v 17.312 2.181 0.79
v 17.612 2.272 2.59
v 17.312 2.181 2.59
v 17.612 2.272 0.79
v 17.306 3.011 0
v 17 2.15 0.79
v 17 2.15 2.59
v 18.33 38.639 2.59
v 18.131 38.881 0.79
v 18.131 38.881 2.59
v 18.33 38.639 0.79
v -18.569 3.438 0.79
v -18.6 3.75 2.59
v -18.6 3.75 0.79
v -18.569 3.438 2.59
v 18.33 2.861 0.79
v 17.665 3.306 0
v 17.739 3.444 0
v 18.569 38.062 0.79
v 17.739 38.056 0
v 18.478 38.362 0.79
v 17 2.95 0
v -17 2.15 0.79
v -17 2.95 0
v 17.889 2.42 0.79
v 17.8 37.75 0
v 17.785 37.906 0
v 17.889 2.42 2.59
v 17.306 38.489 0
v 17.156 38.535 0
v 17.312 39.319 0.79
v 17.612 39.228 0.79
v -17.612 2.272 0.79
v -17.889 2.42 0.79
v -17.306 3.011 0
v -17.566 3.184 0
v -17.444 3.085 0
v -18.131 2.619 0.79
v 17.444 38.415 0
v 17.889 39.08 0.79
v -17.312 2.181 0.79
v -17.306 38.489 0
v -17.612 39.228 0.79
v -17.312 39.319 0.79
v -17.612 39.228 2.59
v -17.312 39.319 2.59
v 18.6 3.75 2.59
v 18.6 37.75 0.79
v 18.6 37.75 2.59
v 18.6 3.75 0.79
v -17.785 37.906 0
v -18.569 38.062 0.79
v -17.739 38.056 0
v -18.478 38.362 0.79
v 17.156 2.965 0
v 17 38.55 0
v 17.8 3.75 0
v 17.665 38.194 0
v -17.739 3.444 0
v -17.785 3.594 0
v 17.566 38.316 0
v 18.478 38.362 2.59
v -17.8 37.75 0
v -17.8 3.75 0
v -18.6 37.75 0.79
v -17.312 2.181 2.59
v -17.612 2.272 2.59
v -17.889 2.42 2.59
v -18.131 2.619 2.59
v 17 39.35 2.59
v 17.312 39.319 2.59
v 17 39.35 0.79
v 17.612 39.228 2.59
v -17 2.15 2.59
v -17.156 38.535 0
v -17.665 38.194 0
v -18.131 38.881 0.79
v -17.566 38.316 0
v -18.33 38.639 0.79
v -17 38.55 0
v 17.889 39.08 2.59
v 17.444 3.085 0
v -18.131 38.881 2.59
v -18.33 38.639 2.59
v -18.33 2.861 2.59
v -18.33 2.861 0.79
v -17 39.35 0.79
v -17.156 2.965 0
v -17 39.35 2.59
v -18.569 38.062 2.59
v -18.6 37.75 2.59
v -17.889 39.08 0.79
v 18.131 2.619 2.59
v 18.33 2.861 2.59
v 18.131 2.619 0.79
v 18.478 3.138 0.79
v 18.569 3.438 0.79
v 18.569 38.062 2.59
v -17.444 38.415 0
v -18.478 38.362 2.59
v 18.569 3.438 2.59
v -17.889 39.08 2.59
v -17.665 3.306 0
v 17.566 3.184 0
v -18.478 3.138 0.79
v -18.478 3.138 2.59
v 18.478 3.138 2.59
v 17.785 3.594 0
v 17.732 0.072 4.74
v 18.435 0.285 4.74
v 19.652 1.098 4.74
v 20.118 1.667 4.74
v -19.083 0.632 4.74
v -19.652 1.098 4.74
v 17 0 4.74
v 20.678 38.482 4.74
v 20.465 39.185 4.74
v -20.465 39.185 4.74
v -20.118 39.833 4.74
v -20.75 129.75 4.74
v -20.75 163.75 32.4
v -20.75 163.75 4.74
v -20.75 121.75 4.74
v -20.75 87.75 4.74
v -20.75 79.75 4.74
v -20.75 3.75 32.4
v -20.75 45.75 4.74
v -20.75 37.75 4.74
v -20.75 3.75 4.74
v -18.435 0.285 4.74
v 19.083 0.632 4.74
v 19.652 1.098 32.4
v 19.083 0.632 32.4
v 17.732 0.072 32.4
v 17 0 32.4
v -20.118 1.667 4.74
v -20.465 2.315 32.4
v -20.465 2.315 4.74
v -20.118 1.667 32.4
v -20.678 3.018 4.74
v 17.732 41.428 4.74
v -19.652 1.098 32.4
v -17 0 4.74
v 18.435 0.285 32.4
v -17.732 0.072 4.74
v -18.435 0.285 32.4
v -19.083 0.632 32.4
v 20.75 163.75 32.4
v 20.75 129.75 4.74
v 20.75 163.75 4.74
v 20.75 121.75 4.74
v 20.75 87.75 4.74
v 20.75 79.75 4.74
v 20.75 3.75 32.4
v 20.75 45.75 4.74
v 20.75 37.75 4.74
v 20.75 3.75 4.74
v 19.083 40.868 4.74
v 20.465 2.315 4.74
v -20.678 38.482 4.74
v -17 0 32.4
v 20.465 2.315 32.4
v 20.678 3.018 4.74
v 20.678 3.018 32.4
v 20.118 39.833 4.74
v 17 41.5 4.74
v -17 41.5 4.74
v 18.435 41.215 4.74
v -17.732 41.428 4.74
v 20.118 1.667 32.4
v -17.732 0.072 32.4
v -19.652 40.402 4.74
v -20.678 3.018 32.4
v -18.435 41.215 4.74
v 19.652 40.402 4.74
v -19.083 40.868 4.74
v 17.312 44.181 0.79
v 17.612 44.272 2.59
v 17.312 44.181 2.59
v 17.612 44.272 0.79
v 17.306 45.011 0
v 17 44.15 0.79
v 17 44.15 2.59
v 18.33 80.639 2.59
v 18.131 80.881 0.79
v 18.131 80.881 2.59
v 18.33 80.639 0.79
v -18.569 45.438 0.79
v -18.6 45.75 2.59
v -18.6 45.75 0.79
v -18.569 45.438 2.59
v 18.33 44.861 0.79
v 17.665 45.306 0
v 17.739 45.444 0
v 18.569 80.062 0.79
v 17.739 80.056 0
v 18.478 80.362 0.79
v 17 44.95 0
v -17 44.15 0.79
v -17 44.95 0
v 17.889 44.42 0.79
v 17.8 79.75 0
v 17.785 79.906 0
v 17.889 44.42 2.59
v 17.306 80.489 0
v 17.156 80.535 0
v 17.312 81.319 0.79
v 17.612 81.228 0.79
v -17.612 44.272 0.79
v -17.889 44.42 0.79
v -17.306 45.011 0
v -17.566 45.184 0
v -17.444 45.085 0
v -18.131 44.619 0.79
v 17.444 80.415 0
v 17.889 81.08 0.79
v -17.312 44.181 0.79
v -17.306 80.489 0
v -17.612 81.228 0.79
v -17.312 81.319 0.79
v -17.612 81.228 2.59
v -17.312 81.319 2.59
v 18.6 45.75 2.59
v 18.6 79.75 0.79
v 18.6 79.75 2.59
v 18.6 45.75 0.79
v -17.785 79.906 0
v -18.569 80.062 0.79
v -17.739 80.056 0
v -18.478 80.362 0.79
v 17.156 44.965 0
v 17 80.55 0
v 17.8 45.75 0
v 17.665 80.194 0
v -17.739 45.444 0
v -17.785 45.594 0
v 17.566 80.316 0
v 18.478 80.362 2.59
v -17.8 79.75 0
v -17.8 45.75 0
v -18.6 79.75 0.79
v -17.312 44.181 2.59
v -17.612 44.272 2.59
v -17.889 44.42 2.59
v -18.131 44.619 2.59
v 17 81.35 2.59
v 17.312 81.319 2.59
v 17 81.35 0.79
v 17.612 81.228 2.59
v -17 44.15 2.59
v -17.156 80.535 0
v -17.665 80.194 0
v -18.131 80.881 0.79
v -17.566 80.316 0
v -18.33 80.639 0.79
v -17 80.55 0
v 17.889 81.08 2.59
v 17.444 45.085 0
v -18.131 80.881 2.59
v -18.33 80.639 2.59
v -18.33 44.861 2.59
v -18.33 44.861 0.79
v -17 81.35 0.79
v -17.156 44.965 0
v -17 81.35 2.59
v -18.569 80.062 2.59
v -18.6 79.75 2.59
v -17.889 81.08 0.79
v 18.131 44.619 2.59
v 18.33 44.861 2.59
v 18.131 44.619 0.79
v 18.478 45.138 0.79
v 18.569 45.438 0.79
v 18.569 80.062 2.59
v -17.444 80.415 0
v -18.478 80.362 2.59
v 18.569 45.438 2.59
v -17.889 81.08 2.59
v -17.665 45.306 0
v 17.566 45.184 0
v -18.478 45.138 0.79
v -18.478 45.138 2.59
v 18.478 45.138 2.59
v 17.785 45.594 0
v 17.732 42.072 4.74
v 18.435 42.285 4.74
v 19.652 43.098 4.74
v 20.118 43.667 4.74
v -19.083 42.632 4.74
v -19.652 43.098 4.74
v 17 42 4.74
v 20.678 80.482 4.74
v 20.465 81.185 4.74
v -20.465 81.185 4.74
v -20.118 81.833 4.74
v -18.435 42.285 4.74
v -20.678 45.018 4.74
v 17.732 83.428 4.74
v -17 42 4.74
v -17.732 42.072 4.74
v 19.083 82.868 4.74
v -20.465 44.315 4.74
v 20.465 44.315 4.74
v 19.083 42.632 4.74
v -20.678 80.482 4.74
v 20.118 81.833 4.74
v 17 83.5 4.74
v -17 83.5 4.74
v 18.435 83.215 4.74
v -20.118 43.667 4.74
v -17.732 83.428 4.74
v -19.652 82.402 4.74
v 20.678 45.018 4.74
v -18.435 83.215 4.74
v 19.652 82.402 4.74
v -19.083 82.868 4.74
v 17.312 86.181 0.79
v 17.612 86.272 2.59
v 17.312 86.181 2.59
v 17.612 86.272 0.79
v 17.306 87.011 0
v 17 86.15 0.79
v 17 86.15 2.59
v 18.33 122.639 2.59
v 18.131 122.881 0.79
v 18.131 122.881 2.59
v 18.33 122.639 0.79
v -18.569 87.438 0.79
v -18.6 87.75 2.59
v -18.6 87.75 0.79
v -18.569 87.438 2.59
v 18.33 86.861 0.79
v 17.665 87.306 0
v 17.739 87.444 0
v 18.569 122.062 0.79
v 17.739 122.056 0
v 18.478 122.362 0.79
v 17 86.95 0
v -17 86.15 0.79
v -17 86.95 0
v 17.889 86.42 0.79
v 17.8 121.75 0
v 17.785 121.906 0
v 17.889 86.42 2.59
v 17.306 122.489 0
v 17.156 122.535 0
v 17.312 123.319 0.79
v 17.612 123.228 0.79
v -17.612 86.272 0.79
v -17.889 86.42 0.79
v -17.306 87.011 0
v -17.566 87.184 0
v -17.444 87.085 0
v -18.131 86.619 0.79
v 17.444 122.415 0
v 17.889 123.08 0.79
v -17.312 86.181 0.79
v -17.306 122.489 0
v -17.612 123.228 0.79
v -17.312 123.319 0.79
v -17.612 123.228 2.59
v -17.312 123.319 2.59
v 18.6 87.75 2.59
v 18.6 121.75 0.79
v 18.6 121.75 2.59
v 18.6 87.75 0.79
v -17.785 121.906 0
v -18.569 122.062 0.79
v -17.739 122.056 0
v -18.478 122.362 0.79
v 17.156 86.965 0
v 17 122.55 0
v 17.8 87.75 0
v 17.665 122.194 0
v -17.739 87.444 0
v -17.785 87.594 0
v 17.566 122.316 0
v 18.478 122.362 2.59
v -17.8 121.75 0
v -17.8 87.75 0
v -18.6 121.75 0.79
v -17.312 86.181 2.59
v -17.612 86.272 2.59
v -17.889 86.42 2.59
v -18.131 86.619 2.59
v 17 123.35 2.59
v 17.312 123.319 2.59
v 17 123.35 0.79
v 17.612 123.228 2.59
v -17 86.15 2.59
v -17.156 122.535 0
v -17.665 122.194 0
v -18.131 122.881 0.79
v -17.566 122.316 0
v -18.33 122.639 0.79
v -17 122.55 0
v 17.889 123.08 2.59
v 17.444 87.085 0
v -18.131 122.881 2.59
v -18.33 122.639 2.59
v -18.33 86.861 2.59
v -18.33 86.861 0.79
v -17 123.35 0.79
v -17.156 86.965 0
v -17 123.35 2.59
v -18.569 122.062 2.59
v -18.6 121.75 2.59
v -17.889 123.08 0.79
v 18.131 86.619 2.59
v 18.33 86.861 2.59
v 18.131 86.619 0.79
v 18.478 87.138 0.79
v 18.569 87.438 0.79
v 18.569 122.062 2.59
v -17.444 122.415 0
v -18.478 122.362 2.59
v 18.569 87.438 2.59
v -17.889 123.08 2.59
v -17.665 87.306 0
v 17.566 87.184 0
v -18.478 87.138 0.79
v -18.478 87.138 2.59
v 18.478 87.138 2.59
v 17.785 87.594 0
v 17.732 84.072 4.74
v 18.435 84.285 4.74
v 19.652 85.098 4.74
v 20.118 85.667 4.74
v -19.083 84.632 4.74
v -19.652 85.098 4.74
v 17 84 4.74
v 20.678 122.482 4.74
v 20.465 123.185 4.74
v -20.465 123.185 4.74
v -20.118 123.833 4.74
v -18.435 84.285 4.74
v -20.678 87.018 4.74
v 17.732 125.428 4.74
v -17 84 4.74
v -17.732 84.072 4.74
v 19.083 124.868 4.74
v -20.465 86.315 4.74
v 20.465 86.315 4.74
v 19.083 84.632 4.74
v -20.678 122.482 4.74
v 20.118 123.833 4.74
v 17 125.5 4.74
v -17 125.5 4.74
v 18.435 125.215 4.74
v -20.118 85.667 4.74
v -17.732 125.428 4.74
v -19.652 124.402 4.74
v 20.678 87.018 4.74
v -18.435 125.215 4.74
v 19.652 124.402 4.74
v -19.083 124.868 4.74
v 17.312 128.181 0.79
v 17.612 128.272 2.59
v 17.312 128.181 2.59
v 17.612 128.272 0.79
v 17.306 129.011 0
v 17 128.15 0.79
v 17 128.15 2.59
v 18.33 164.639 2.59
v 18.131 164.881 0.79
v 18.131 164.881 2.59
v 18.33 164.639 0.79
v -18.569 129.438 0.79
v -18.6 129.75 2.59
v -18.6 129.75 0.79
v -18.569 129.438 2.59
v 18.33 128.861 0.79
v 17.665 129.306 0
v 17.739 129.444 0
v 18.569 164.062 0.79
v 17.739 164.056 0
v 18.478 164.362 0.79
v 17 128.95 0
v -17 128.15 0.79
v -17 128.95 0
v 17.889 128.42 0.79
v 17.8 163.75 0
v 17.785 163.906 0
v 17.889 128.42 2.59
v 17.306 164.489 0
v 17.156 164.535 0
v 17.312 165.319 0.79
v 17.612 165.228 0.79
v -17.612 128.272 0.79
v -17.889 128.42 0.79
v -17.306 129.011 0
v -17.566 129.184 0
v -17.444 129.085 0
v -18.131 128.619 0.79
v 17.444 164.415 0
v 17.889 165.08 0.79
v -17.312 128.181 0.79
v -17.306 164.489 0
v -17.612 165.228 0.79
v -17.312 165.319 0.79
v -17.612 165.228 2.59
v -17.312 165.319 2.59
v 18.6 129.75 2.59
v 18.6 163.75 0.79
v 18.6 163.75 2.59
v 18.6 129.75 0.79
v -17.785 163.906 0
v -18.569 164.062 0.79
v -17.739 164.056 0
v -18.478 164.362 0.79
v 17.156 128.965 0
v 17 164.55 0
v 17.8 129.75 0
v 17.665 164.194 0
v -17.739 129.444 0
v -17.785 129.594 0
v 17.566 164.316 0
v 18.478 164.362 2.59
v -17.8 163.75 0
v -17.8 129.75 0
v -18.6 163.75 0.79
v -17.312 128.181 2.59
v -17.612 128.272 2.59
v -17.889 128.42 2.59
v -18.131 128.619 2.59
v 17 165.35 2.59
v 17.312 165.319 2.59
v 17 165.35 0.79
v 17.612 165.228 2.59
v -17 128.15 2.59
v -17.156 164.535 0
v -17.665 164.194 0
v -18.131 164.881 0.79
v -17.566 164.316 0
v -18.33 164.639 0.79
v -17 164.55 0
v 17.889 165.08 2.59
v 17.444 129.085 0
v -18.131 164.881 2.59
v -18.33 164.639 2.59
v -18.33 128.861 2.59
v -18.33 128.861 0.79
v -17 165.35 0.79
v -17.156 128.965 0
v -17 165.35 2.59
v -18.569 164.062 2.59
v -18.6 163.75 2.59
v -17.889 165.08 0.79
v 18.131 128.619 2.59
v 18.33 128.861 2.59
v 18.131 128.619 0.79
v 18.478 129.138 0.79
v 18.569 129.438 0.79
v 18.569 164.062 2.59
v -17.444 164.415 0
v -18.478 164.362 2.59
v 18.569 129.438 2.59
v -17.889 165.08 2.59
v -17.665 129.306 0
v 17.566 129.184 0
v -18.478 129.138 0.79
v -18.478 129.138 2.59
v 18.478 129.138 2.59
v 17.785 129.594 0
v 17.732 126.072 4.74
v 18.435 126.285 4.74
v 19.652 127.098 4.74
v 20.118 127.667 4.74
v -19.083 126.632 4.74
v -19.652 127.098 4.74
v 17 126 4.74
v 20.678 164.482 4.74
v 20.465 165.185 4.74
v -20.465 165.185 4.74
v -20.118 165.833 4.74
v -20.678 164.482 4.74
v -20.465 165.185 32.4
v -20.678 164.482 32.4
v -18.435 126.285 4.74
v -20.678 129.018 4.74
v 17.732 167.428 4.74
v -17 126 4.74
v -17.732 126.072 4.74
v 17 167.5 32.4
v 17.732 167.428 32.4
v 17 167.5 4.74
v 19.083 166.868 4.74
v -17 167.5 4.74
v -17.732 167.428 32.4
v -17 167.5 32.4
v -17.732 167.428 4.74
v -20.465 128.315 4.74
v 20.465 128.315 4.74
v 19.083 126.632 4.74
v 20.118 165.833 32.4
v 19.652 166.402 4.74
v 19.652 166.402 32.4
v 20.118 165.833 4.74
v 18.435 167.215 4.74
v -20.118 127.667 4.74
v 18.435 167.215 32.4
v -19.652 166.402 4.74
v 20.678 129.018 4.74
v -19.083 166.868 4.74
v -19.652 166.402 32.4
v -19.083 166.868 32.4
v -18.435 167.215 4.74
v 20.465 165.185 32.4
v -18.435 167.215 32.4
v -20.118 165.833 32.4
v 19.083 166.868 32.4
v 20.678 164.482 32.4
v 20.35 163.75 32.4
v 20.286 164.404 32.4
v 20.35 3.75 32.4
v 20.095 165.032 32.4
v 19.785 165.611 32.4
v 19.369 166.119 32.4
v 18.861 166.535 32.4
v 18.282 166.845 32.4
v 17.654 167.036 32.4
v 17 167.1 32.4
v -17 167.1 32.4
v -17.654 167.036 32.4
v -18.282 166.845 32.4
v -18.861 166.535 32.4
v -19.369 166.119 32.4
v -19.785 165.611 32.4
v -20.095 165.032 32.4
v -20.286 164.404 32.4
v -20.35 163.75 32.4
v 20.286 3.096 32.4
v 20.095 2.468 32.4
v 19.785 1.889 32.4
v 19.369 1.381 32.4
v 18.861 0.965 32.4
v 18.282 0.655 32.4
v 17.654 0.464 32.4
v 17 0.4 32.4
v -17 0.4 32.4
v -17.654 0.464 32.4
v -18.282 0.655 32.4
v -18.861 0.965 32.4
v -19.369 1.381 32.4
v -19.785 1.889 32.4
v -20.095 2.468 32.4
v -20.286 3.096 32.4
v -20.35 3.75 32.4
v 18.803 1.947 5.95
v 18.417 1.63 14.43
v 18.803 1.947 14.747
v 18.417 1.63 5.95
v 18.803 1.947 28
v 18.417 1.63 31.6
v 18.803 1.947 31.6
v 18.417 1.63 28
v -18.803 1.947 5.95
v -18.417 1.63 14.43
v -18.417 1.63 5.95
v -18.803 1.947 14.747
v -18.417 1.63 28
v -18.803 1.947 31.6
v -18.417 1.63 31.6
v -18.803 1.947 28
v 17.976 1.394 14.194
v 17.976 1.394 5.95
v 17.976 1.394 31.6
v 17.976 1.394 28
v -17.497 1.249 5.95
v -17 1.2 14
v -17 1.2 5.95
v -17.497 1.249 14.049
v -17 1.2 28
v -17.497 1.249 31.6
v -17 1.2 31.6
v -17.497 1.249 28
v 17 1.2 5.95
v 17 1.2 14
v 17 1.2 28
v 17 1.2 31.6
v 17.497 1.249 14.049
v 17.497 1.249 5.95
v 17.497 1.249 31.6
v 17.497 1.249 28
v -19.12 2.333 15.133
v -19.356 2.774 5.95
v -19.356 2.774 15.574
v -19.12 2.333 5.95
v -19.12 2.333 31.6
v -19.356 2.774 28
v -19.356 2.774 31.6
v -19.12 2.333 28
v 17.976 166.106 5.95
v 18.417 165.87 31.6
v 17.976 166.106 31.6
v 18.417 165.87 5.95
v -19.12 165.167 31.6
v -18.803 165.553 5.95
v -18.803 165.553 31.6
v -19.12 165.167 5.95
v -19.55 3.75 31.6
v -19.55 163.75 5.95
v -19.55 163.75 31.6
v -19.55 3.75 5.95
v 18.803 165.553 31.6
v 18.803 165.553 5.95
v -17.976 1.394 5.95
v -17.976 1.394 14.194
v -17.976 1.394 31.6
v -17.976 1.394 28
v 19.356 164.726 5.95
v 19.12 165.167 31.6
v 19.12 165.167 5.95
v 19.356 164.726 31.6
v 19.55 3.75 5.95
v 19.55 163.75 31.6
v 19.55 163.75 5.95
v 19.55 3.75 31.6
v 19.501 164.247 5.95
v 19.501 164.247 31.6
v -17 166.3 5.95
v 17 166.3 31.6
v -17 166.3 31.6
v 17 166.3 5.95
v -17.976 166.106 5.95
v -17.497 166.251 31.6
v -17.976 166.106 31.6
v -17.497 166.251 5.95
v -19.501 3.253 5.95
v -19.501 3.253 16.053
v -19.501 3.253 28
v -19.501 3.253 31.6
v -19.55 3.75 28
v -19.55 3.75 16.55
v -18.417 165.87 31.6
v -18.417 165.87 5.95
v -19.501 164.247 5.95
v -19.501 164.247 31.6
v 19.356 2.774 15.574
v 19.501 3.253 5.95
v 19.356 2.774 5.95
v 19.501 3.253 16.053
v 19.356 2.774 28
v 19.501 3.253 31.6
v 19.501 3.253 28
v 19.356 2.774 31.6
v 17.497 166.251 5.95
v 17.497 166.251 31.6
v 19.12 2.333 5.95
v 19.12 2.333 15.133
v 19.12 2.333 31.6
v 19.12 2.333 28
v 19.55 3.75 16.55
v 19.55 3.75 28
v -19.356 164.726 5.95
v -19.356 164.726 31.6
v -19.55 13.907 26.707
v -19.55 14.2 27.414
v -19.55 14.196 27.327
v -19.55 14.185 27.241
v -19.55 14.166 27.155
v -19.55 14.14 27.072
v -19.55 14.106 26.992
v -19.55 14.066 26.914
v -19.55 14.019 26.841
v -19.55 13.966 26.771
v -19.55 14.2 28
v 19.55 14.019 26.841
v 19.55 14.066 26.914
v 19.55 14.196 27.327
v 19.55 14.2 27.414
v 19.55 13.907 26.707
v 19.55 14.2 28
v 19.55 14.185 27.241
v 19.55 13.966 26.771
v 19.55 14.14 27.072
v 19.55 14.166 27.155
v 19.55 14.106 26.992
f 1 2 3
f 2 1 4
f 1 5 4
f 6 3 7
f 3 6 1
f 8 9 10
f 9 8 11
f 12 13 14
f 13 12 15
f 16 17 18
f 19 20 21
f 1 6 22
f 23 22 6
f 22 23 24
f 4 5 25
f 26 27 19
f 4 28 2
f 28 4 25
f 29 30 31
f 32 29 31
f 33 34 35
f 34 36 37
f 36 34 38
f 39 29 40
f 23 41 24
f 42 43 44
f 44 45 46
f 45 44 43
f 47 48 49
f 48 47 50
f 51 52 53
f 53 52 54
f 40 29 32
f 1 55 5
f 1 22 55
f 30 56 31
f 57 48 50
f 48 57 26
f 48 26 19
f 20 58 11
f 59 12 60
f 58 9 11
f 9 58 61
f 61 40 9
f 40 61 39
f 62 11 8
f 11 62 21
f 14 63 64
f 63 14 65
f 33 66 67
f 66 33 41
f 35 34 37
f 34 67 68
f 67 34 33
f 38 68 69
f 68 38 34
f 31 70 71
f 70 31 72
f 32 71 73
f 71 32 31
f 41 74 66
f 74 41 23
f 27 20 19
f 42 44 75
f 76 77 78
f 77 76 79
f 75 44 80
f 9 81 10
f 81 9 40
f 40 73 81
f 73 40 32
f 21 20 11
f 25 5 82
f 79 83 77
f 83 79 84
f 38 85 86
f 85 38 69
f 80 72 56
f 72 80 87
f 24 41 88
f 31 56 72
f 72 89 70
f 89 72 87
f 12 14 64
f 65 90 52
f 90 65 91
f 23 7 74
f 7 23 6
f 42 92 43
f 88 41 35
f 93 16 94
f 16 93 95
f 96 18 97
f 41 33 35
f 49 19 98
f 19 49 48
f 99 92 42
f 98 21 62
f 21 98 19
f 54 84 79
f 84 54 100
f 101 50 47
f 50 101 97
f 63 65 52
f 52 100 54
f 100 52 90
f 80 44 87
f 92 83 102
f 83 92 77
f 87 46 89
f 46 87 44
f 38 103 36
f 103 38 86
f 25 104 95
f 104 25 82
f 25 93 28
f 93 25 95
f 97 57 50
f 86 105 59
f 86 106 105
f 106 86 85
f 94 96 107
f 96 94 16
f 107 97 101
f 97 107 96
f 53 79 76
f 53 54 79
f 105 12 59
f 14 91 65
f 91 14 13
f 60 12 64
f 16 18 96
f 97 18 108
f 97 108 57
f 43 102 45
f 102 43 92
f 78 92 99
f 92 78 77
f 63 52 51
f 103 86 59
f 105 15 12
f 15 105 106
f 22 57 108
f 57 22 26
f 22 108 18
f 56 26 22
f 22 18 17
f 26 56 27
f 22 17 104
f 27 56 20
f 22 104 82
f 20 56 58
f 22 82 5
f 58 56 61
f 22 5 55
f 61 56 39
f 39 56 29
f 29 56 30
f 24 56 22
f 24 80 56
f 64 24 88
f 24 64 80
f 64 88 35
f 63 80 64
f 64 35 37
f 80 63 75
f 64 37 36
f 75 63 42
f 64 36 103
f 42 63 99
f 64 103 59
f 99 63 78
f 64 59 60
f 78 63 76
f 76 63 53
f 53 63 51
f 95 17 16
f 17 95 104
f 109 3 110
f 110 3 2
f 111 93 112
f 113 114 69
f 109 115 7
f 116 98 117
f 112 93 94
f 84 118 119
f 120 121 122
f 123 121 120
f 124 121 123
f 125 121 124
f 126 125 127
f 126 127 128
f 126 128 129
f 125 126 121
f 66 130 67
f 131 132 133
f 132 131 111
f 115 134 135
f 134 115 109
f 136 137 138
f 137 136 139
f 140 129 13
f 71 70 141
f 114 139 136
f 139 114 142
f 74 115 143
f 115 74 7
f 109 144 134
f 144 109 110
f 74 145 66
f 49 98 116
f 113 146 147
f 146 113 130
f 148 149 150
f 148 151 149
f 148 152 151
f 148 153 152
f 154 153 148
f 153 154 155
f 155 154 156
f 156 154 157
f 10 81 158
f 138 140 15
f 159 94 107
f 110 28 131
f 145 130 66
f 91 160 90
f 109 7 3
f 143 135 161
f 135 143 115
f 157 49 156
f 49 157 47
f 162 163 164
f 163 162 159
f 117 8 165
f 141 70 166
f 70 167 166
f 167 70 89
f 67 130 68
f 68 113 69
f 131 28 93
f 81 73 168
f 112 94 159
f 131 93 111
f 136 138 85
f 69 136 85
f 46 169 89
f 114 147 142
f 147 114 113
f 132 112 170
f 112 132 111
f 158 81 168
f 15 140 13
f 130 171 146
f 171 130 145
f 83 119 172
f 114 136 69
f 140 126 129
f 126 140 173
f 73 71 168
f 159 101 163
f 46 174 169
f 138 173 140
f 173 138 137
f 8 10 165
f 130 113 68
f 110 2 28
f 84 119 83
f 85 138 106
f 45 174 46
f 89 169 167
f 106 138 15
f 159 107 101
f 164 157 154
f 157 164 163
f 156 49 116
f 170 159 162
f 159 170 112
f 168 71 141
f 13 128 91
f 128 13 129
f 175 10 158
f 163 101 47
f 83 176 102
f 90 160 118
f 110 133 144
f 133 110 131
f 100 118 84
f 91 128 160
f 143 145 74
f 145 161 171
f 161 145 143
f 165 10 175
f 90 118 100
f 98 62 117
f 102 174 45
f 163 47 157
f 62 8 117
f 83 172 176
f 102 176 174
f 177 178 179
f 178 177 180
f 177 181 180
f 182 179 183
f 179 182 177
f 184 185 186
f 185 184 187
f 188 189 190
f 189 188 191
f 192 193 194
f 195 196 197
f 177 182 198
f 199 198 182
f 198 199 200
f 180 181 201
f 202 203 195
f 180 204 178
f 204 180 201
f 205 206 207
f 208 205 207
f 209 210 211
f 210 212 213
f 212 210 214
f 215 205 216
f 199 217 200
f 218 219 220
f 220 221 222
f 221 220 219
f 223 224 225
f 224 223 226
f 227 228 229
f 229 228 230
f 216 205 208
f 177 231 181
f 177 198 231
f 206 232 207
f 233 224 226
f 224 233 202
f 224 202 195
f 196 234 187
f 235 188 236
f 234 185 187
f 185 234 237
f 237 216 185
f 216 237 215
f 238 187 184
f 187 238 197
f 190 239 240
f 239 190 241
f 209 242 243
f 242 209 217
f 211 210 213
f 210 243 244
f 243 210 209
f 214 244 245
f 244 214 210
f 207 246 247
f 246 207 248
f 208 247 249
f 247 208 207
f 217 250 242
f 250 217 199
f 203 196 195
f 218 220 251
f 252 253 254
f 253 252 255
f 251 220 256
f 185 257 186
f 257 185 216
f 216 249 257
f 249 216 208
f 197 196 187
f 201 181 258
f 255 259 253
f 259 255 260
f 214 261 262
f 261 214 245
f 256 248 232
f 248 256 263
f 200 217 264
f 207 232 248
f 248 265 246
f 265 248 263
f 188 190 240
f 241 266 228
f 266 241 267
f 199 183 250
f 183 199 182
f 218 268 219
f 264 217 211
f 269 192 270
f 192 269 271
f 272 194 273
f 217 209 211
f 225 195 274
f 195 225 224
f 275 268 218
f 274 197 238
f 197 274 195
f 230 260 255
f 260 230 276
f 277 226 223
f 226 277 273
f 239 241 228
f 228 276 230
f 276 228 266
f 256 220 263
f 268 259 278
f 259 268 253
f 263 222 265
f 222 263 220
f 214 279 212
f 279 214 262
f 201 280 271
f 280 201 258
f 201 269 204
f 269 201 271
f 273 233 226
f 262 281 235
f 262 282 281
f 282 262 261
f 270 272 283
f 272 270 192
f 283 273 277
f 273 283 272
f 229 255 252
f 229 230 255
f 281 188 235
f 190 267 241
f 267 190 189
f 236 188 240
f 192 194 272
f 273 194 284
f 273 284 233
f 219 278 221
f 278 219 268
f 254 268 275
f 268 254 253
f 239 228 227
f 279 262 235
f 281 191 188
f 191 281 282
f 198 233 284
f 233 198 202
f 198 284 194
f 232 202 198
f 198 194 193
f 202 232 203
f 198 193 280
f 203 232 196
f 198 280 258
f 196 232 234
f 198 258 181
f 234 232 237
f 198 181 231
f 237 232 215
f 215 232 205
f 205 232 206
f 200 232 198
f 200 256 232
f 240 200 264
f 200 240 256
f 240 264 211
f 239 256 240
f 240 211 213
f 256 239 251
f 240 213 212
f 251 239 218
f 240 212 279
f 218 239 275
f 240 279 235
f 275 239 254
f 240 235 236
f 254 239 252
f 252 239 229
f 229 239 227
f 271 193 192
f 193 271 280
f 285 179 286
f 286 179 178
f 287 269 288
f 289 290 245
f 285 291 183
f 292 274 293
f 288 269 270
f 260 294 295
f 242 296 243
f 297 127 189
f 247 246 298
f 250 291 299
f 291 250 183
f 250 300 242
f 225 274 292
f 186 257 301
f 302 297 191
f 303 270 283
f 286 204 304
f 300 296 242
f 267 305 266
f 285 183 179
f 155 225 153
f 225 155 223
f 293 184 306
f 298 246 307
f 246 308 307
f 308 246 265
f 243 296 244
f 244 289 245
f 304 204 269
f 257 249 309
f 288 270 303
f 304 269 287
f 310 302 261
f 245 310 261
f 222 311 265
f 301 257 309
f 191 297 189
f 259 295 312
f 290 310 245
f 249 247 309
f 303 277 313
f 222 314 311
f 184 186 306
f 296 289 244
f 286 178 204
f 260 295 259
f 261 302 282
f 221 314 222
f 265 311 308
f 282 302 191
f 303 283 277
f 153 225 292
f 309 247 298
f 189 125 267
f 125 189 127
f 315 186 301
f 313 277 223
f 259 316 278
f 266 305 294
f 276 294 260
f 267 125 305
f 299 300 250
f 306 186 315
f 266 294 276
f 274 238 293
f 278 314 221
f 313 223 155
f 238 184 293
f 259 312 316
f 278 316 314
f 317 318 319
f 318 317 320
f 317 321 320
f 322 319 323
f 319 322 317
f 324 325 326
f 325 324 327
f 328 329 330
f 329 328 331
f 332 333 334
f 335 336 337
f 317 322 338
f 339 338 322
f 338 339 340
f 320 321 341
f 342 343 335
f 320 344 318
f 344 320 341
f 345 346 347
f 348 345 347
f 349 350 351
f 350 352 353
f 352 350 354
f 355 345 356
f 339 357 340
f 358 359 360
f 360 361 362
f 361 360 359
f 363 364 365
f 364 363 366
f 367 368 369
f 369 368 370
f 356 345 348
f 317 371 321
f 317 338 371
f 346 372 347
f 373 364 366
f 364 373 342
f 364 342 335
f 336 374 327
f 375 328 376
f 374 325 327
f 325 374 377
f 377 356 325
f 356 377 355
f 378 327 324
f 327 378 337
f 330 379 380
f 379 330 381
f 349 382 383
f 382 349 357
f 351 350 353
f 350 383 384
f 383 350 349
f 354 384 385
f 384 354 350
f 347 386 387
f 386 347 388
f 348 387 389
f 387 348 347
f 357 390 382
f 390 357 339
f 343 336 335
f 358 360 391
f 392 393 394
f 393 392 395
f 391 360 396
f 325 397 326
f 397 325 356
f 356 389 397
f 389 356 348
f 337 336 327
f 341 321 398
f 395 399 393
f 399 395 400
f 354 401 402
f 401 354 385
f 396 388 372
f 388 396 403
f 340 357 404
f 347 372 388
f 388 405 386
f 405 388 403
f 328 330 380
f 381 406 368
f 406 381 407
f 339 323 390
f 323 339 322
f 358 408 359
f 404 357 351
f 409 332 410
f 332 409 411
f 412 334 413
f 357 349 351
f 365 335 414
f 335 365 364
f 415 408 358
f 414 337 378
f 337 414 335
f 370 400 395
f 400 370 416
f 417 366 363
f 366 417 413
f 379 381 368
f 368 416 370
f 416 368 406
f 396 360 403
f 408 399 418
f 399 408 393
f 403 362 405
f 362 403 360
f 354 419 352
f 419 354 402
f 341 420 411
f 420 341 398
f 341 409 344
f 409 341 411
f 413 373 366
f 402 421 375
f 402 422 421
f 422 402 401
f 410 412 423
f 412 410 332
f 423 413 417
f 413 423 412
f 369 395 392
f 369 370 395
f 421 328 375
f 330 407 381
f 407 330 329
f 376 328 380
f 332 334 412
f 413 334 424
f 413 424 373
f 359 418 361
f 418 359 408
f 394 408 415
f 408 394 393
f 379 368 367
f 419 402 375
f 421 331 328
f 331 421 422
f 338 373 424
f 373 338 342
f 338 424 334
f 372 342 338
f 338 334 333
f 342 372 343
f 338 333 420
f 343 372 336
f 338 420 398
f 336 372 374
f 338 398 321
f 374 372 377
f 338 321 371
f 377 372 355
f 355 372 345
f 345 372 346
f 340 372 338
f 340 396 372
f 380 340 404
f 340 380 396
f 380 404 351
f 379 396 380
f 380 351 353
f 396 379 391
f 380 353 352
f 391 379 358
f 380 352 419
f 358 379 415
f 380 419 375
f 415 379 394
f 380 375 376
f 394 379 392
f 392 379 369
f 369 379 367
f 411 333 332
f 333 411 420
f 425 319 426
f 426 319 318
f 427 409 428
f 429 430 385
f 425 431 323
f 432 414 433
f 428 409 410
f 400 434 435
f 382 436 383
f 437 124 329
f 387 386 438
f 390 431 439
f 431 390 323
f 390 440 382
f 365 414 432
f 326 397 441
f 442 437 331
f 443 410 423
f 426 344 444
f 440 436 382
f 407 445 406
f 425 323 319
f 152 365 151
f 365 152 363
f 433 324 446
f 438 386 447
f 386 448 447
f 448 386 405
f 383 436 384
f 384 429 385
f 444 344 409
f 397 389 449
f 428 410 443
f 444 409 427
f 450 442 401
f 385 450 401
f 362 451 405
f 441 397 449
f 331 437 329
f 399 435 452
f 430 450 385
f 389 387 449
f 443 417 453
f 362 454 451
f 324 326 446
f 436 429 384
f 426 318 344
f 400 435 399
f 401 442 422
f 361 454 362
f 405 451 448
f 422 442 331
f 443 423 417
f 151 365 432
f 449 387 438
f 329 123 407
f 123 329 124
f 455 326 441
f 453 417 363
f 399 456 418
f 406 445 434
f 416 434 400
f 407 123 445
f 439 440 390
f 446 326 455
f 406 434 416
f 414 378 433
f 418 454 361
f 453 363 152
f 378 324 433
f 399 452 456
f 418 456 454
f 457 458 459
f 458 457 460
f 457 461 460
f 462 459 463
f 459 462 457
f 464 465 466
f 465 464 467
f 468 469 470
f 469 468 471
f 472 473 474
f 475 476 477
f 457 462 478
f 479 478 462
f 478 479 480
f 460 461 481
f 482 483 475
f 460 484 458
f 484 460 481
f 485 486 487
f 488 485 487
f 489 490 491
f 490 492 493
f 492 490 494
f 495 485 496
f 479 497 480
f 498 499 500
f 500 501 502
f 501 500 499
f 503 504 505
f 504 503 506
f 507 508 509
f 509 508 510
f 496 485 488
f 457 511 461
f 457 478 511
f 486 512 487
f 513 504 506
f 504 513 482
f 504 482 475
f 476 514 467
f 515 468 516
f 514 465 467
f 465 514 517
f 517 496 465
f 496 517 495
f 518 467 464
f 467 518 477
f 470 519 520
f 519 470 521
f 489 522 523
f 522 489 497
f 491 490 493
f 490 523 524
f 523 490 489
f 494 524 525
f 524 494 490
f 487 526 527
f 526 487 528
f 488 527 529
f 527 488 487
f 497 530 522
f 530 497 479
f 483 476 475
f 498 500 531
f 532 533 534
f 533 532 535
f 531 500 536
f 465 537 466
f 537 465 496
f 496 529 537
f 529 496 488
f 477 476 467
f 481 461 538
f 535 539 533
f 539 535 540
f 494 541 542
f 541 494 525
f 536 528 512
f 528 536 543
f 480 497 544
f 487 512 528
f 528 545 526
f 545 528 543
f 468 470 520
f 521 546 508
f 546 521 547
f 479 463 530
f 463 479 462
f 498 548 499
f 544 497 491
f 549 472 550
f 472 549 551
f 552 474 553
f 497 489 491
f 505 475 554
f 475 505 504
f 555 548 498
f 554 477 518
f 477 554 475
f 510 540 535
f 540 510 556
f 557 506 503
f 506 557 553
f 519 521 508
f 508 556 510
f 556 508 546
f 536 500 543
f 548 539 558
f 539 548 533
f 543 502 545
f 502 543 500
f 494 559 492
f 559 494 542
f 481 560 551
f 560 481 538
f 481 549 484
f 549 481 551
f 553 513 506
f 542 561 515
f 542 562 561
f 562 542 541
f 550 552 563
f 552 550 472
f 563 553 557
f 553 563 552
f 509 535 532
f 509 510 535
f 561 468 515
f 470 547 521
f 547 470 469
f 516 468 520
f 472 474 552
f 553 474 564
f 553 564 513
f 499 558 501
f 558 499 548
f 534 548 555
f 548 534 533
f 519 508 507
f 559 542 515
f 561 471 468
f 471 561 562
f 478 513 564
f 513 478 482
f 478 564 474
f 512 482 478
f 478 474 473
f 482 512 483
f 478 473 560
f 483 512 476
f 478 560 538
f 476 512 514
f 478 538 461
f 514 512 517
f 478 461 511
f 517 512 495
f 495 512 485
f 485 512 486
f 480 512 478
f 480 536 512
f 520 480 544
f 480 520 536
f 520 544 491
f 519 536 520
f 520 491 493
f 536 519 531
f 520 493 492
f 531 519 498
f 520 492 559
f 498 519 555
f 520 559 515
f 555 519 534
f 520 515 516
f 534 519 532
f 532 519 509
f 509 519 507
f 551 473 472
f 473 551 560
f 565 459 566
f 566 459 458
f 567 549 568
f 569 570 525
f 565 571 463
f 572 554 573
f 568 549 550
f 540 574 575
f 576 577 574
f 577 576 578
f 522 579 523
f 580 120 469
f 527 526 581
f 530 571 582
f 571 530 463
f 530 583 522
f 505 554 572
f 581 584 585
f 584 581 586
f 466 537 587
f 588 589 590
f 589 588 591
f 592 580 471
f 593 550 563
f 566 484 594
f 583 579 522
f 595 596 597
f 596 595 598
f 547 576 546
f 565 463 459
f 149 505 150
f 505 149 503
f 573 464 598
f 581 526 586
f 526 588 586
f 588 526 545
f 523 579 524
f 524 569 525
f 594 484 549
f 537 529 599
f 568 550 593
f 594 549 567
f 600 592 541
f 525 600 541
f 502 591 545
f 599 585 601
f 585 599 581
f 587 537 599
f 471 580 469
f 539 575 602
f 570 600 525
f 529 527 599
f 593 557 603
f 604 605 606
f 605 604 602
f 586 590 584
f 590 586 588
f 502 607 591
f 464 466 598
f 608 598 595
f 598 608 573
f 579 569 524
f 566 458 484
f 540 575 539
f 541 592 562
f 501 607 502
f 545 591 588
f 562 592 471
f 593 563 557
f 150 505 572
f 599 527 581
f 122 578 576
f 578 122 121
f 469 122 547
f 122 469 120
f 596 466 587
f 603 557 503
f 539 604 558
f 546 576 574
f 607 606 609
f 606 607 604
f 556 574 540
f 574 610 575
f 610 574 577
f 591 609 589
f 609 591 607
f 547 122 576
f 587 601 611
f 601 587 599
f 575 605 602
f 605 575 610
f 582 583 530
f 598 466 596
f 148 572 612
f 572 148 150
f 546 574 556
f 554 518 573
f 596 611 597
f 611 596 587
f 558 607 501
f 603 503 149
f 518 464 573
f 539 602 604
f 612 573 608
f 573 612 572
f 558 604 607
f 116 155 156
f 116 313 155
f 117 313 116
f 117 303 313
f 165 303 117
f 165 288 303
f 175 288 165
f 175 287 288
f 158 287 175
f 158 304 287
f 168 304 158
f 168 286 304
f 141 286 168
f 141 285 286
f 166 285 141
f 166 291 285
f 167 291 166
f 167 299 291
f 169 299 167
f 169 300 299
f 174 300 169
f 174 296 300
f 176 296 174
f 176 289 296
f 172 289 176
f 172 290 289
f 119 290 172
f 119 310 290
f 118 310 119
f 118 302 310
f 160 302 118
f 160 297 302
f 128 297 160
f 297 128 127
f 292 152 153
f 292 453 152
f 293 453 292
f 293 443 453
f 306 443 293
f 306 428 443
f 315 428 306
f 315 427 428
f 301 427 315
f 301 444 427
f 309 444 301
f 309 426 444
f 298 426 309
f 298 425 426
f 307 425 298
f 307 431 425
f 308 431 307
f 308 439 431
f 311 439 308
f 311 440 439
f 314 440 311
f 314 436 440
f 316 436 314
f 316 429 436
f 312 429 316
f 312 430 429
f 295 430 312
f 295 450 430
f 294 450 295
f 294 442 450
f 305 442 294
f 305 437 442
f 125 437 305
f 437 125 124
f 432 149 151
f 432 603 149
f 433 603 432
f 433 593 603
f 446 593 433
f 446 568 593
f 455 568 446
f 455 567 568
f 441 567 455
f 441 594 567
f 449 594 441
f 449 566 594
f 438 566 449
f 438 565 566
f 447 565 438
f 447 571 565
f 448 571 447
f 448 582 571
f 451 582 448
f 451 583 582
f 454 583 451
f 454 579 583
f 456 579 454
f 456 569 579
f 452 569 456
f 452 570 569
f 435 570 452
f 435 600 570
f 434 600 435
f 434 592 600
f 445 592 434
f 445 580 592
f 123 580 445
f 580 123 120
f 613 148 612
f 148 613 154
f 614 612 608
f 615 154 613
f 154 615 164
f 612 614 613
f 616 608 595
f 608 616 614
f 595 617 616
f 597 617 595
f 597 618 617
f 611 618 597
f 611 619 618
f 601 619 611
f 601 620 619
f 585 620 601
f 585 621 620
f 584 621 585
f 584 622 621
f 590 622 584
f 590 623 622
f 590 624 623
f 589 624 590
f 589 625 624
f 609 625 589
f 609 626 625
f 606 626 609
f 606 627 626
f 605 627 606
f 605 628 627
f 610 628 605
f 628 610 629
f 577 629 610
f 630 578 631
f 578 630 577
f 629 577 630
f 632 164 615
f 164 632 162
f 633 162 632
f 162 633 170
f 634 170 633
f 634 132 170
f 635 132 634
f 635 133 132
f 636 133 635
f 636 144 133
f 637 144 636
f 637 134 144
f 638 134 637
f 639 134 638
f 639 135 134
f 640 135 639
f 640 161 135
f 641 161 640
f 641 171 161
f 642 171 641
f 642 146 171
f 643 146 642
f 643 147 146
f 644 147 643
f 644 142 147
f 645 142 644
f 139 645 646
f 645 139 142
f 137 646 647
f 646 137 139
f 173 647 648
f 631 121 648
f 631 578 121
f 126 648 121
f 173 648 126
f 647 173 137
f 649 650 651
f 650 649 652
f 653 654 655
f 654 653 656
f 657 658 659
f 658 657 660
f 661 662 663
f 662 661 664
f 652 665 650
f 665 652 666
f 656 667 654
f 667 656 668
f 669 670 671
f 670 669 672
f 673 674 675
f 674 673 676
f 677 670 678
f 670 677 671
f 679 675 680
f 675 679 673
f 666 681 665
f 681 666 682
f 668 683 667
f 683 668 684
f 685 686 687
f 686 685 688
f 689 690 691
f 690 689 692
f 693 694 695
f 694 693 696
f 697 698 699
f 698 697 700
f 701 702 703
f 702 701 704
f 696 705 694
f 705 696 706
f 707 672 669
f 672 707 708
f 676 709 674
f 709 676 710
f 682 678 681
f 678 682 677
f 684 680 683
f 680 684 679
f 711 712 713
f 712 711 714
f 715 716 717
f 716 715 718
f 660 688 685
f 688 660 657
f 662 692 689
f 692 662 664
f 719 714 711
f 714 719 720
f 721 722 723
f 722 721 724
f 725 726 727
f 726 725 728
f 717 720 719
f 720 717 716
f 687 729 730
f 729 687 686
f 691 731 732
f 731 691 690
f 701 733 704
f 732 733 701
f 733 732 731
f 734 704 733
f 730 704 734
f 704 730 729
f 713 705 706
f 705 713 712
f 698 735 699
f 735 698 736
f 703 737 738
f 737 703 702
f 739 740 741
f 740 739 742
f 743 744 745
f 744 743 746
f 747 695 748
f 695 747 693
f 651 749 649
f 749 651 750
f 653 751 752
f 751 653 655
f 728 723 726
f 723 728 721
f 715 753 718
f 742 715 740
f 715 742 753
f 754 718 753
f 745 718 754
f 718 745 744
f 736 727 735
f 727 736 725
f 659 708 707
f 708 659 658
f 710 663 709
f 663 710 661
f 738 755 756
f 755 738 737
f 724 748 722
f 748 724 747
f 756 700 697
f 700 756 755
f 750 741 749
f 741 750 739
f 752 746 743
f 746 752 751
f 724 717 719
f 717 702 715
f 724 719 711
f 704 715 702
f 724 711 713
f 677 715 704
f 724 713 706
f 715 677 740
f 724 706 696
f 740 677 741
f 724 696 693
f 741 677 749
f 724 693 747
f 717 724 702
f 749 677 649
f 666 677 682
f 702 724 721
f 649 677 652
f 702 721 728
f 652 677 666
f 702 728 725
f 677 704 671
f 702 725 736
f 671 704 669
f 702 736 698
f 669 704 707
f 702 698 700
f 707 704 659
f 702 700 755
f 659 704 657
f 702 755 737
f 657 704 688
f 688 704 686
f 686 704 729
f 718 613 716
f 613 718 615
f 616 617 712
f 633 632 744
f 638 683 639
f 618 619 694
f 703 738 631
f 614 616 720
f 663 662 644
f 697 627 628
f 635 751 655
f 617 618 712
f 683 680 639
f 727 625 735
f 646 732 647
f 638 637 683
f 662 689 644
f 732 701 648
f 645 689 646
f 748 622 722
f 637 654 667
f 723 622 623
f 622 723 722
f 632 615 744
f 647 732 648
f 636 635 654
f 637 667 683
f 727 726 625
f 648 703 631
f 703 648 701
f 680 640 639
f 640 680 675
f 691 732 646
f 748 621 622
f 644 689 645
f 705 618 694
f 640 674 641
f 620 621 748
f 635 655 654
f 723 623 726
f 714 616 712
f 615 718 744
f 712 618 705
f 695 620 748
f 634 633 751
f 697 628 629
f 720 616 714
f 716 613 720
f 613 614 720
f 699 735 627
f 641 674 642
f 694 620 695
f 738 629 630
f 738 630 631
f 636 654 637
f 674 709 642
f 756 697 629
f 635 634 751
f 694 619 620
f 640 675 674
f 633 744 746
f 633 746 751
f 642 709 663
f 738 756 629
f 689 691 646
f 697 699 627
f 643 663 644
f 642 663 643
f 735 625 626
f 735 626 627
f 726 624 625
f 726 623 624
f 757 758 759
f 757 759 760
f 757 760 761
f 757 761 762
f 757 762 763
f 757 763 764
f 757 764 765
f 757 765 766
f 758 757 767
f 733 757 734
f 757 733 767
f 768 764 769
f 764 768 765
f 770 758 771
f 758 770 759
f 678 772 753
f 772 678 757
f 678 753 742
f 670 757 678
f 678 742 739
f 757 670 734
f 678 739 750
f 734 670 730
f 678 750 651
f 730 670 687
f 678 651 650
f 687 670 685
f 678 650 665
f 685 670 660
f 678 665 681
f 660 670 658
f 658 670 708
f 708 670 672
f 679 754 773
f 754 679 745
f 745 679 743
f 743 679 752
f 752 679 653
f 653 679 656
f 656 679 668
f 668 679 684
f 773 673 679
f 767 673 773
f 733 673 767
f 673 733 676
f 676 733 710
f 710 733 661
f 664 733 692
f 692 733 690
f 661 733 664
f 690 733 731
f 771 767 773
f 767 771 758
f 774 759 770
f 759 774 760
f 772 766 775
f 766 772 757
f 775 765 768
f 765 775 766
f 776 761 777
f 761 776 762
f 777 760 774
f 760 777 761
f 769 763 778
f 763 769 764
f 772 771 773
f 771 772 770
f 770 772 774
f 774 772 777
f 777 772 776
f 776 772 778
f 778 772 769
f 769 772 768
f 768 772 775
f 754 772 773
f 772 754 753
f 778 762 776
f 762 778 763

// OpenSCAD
// file: ../../modules/gridfinity.scad
// Gridfinity ベースプレートの共有 module。
// 寸法は Gridfinity 仕様 (Zack Freedman) の baseplate 輪郭に従う:
//   ピッチ 42、ソケット上端開口 41.5 (角 R4)、上から 45° 面取り 2.15 →
//   垂直 1.8 (37.2 角・R1.85) → 45° 面取り 0.7 → 底 35.8 角 (R1.15)。
//   ソケット深さ = 2.15 + 1.8 + 0.7 = 4.65。
//
// 座標系: X が列方向 (中央が 0)、Y が行方向 (板の前端が 0)、Z=0 が板の底面。
// 板の外形は grid とは独立に rim で与えるので、grid より大きい板 (縁付き) を
// 作れる。ソケットは rim=[left, right, front, back] の内側へ 42 ピッチで並ぶ。

gf_pitch = 42;
gf_socket_top = 41.5; // 上端開口
gf_socket_mid = 37.2; // 垂直部
gf_socket_bot = 35.8; // 底
gf_socket_r_top = 4;
gf_socket_r_mid = 1.85;
gf_socket_r_bot = 1.15;
gf_chamfer_top = 2.15;
gf_wall_h = 1.8;
gf_chamfer_bot = 0.7;
gf_socket_depth = gf_chamfer_top + gf_wall_h + gf_chamfer_bot; // 4.65
gf_fn = 32;
gf_eps = 0.01; // hull 用の薄板の厚さ
gf_over = 0.5; // 切削の抜き代

// 角丸正方形 (一辺 w、角 R)
module
gf_rounded_square(w, r)
{
    offset(r = r, $fn = gf_fn) square(w - 2 * r, center = true);
}

// 厚さ gf_eps の角丸正方形の薄板を z に置く (hull の骨)
module
gf_slab(w, r, z)
{
    translate([ 0, 0, z ]) linear_extrude(gf_eps) gf_rounded_square(w, r);
}

// ソケット1個の切削体。z=0 がソケットの底 (床の天面)、+Z へ 4.65 で天面に出る。
// clearance は嵌合の逃げで、輪郭を全周へ clearance だけ外へ出す (幅 +2c、角 R
// +c)。 既定 0 が Gridfinity の公称輪郭。深さとピッチは変えない
module
gf_socket_cut(clearance = 0)
{
    z1 = gf_chamfer_bot;
    z2 = z1 + gf_wall_h;
    z3 = gf_socket_depth;
    c = clearance;
    hull()
    {
        gf_slab(gf_socket_bot + 2 * c, gf_socket_r_bot + c, 0);
        gf_slab(gf_socket_mid + 2 * c, gf_socket_r_mid + c, z1 - gf_eps);
    }
    hull()
    {
        gf_slab(gf_socket_mid + 2 * c, gf_socket_r_mid + c, z1 - gf_eps);
        gf_slab(gf_socket_mid + 2 * c, gf_socket_r_mid + c, z2 - gf_eps);
    }
    hull()
    {
        gf_slab(gf_socket_mid + 2 * c, gf_socket_r_mid + c, z2 - gf_eps);
        gf_slab(gf_socket_top + 2 * c, gf_socket_r_top + c, z3 - gf_eps);
    }
    // 天面より上へ抜く (天面と同一平面の退化した面を残さない)
    gf_slab(gf_socket_top + 2 * c, gf_socket_r_top + c, z3 - gf_eps);
    translate([ 0, 0, z3 - gf_eps ]) linear_extrude(gf_over + gf_eps)
        gf_rounded_square(gf_socket_top + 2 * c, gf_socket_r_top + c);
}

// ベースプレート。cols x rows のソケットを床 floor_t の上に彫る。
// rim = [left, right, front, back] はソケット列の外側に残す縁の幅。
// 板の幅 = cols*42 + left + right、奥行き = rows*42 + front + back。
// clearance はソケットの嵌合の逃げ (gf_socket_cut を参照)。
module
gf_baseplate(cols, rows, rim = [ 0, 0, 0, 0 ], floor_t = 1, clearance = 0)
{
    grid_w = cols * gf_pitch;
    grid_d = rows * gf_pitch;
    plate_w = grid_w + rim[0] + rim[1];
    plate_d = grid_d + rim[2] + rim[3];
    x0 = -plate_w / 2 + rim[0]; // ソケット列の左端
    difference()
    {
        translate([ -plate_w / 2, 0, 0 ])
            cube([ plate_w, plate_d, floor_t + gf_socket_depth ]);
        for (c = [0:cols - 1], r = [0:rows - 1])
            translate([
                x0 + (c + 0.5) * gf_pitch,
                rim[2] + (r + 0.5) * gf_pitch,
                floor_t
            ]) gf_socket_cut(clearance);
    }
}
// file: ../../modules/gridfinity_bin.scad
include <gridfinity.scad>

// Gridfinity bin (箱) の共有 module。ピッチと角丸は gridfinity.scad
// と共有する。 底の輪郭は Gridfinity 仕様の bin base (下から):
//   35.6 角 (R0.8) → 45° 0.8 → 37.2 角 (R1.6) → 垂直 1.8 → 45° 2.15 → 41.5 角
//   (R3.75) 高さ 0.8 + 1.8 + 2.15 = 4.75。磁石穴・ネジ穴は持たない (無垢)
// 外形はピッチ − 0.5 (1 マス 41.5)、角 R3.75。高さ単位 7 (4U = 28 が壁の上端)。
// リップは「薄いリップ」: 壁 (1.2) をそのまま lip_h (4.4) 伸ばし、内側の上端を
// 45° に落とすだけ。内側に棚 (厚い肉) を持たないので、上に載せる bin は底の
// 面取りをこの 45° に座らせる。
//
// 座標系: X が列方向 (中央 0)、Y が行方向 (手前 = ラベル側が 0)、Z=0 が底面。

gfb_outer = gf_pitch - 0.5; // 41.5
gfb_outer_r = 3.75;
gfb_base_bot = 35.6;
gfb_base_bot_r = 0.8;
gfb_base_mid = 37.2;
gfb_base_mid_r = 1.6;
gfb_base_chamfer_bot = 0.8;
gfb_base_wall_h = 1.8;
gfb_base_chamfer_top = 2.15;
gfb_base_h =
    gfb_base_chamfer_bot + gfb_base_wall_h + gfb_base_chamfer_top; // 4.75
gfb_unit = 7;
gfb_lip_h = 4.4;
gfb_lip_chamfer = 0.8;

// bin 1 マスぶんの底 (無垢)。z=0 が底面、gfb_base_h で外形 41.5 角に達する
module
gfb_base_cell()
{
    z1 = gfb_base_chamfer_bot;
    z2 = z1 + gfb_base_wall_h;
    z3 = gfb_base_h;
    hull()
    {
        gf_slab(gfb_base_bot, gfb_base_bot_r, 0);
        gf_slab(gfb_base_mid, gfb_base_mid_r, z1 - gf_eps);
    }
    hull()
    {
        gf_slab(gfb_base_mid, gfb_base_mid_r, z1 - gf_eps);
        gf_slab(gfb_base_mid, gfb_base_mid_r, z2 - gf_eps);
    }
    hull()
    {
        gf_slab(gfb_base_mid, gfb_base_mid_r, z2 - gf_eps);
        gf_slab(gfb_outer, gfb_outer_r, z3 - gf_eps);
    }
}

// cols x rows の角丸矩形 (外形)
module
gfb_footprint(cols, rows, inset = 0)
{
    w = cols * gf_pitch - 0.5 - 2 * inset;
    d = rows * gf_pitch - 0.5 - 2 * inset;
    translate([ 0, d / 2 + inset ])
        gf_rounded_square_wd(w, d, gfb_outer_r - inset);
}

// 幅 w × 奥行き d の角丸矩形 (中心が原点)
module
gf_rounded_square_wd(w, d, r)
{
    offset(r = r, $fn = gf_fn) square([ w - 2 * r, d - 2 * r ], center = true);
}

// ラベル天板の Y-Z 断面 (y = 壁の内面からの距離、z = 高さ)。天板 (厚さ t) の
// 先端から 45° の斜面が壁まで下りる無垢のくさび。先端の垂直面と斜面の境目
// (135°) を半径 r で丸める: 円弧の中心は先端の角から (-r, r·tan22.5°)、接点は
// 垂直面上の角 + (0, r·tan22.5°) と斜面上の角 + 0.4142r·(-1,-1)。壁の内側へ
// 1 だけ食い込ませて胴体と溶かす
function gfb_label_profile(d, t, h, r) =
    let(y0 = d, z0 = h - t, cy = y0 - r, cz = z0 + r * tan(22.5))
        concat([ [ -1, h ], [ d, h ] ],
               [for (a = [0:-5:-45])[cy + r * cos(a), cz + r* sin(a)]],
               [[ -1, h - t - d - 1 ]]);

// bin 本体。units は高さ (U)。wall / floor_t は壁と床の厚さ。
// label_d > 0 なら手前 (y=0) の壁の上端 (z = units*7) と面一で内側へ label_d
// 張り出す厚さ label_t のラベル天板を付ける。天板の下は 45° の無垢のくさびが
// 壁まで下りる (ブリッジもリブも無い。中身はスライサのインフィル任せ)。
// 天板の先端と 45° 面の境目は半径 label_r で丸める
module
gfb_bin(cols,
        rows,
        units = 4,
        wall = 1.2,
        floor_t = 1.2,
        label_d = 0,
        label_t = 1,
        label_r = 1)
{
    h = units * gfb_unit; // 壁の上端
    top = h + gfb_lip_h;  // リップの上端
    inner_w = cols * gf_pitch - 0.5 - 2 * wall;
    floor_top = gfb_base_h + floor_t;
    union()
    {
        // 底: マスごとの無垢の base
        for (c = [0:cols - 1], r = [0:rows - 1])
            translate([
                (c - (cols - 1) / 2) * gf_pitch,
                (r + 0.5) * gf_pitch - 0.25,
                0
            ]) gfb_base_cell();
        // 胴体: base の上から top
        // まで。内側は床の上を抜く。リップの内側の上端は 45°
        difference()
        {
            translate([ 0, 0, gfb_base_h - gf_eps ])
                linear_extrude(top - gfb_base_h + gf_eps)
                    gfb_footprint(cols, rows);
            translate([ 0, 0, floor_top ])
                linear_extrude(top - floor_top + gf_over)
                    gfb_footprint(cols, rows, wall);
            // リップ内側の面取り: 上端で wall − 0.4 まで開く
            hull()
            {
                translate([ 0, 0, top - gfb_lip_chamfer ])
                    linear_extrude(gf_eps) gfb_footprint(cols, rows, wall);
                translate([ 0, 0, top ]) linear_extrude(gf_over)
                    gfb_footprint(cols, rows, wall - gfb_lip_chamfer);
            }
        }
        // ラベル天板と 45° くさび (内幅いっぱい、同じ断面)。壁へ 1 食い込ませた
        // 矩形の柱なので、角の丸み (R3.75) の外へ出ないよう外形で切り取る
        if (label_d > 0)
            intersection()
            {
                translate([ -inner_w / 2, wall, 0 ]) rotate([ 90, 0, 90 ])
                    linear_extrude(inner_w) polygon(
                        gfb_label_profile(label_d, label_t, h, label_r));
                linear_extrude(top) gfb_footprint(cols, rows);
            }
    }
}
// file: ../../modules/gridfinity_bin_4u.scad
include <gridfinity_bin.scad>

// assets/gridfinity-bin/ の bin 群の共通値と、サイズ 3 引数の払い出し口。
// 単体では何も描かない。設計の経緯と確定値は
// ledger/designs/gridfinity-bin-4u.md が正本。 保証する範囲は cols 1..2 ×
// rows 1..5 × units 4 (assets に並ぶ 10 種)。 cols が X (横)、rows が Y
// (ラベルの壁から奥へ)、units が高さ (7mm 単位)。
wall = 1.2;    // 0.4 ノズル 3 本
floor_t = 1.2; // 底 (4.75) の上に載せる床。床の天面 z = 5.95
label_d = 13;  // 12mm 幅のラベルシールを貼る天板の張り出し
label_t = 1; // 天板の厚さ (user 指定)。下は 45° の無垢のくさび
label_r = 1; // 天板の先端と 45° 面の境目の R (user 指定)

function bin_contract(cols, rows, units) = str("CONTRACT units=",
                                               units,
                                               " pitch=",
                                               gf_pitch,
                                               " outer=",
                                               gfb_outer,
                                               " h=",
                                               units* gfb_unit,
                                               " lip=",
                                               gfb_lip_h,
                                               " base=",
                                               gfb_base_bot,
                                               "/",
                                               gfb_base_mid,
                                               "/",
                                               gfb_outer,
                                               " base_h=",
                                               gfb_base_h,
                                               " wall=",
                                               wall,
                                               " floor_top=",
                                               gfb_base_h + floor_t,
                                               " label=",
                                               label_d,
                                               "x",
                                               label_t,
                                               " wedge=45 fillet=",
                                               label_r,
                                               " bin=",
                                               cols,
                                               "x",
                                               rows,
                                               " size=",
                                               cols* gf_pitch - 0.5,
                                               "x",
                                               rows* gf_pitch - 0.5);

// (cols, rows, units) でラベル付き bin を払い出す。例: gridfinity_bin(2, 4, 4)
module
gridfinity_bin(cols, rows, units = 4)
{
    echo(bin_contract(cols, rows, units));
    gfb_bin(cols, rows, units, wall, floor_t, label_d, label_t, label_r);
}
// main file
include <../../modules/gridfinity_bin_4u.scad>

// 1x4 マス、高さ 4U のラベル天板付き bin。ラベルは手前 (y=0) 側
gridfinity_bin(1, 4, 4);
